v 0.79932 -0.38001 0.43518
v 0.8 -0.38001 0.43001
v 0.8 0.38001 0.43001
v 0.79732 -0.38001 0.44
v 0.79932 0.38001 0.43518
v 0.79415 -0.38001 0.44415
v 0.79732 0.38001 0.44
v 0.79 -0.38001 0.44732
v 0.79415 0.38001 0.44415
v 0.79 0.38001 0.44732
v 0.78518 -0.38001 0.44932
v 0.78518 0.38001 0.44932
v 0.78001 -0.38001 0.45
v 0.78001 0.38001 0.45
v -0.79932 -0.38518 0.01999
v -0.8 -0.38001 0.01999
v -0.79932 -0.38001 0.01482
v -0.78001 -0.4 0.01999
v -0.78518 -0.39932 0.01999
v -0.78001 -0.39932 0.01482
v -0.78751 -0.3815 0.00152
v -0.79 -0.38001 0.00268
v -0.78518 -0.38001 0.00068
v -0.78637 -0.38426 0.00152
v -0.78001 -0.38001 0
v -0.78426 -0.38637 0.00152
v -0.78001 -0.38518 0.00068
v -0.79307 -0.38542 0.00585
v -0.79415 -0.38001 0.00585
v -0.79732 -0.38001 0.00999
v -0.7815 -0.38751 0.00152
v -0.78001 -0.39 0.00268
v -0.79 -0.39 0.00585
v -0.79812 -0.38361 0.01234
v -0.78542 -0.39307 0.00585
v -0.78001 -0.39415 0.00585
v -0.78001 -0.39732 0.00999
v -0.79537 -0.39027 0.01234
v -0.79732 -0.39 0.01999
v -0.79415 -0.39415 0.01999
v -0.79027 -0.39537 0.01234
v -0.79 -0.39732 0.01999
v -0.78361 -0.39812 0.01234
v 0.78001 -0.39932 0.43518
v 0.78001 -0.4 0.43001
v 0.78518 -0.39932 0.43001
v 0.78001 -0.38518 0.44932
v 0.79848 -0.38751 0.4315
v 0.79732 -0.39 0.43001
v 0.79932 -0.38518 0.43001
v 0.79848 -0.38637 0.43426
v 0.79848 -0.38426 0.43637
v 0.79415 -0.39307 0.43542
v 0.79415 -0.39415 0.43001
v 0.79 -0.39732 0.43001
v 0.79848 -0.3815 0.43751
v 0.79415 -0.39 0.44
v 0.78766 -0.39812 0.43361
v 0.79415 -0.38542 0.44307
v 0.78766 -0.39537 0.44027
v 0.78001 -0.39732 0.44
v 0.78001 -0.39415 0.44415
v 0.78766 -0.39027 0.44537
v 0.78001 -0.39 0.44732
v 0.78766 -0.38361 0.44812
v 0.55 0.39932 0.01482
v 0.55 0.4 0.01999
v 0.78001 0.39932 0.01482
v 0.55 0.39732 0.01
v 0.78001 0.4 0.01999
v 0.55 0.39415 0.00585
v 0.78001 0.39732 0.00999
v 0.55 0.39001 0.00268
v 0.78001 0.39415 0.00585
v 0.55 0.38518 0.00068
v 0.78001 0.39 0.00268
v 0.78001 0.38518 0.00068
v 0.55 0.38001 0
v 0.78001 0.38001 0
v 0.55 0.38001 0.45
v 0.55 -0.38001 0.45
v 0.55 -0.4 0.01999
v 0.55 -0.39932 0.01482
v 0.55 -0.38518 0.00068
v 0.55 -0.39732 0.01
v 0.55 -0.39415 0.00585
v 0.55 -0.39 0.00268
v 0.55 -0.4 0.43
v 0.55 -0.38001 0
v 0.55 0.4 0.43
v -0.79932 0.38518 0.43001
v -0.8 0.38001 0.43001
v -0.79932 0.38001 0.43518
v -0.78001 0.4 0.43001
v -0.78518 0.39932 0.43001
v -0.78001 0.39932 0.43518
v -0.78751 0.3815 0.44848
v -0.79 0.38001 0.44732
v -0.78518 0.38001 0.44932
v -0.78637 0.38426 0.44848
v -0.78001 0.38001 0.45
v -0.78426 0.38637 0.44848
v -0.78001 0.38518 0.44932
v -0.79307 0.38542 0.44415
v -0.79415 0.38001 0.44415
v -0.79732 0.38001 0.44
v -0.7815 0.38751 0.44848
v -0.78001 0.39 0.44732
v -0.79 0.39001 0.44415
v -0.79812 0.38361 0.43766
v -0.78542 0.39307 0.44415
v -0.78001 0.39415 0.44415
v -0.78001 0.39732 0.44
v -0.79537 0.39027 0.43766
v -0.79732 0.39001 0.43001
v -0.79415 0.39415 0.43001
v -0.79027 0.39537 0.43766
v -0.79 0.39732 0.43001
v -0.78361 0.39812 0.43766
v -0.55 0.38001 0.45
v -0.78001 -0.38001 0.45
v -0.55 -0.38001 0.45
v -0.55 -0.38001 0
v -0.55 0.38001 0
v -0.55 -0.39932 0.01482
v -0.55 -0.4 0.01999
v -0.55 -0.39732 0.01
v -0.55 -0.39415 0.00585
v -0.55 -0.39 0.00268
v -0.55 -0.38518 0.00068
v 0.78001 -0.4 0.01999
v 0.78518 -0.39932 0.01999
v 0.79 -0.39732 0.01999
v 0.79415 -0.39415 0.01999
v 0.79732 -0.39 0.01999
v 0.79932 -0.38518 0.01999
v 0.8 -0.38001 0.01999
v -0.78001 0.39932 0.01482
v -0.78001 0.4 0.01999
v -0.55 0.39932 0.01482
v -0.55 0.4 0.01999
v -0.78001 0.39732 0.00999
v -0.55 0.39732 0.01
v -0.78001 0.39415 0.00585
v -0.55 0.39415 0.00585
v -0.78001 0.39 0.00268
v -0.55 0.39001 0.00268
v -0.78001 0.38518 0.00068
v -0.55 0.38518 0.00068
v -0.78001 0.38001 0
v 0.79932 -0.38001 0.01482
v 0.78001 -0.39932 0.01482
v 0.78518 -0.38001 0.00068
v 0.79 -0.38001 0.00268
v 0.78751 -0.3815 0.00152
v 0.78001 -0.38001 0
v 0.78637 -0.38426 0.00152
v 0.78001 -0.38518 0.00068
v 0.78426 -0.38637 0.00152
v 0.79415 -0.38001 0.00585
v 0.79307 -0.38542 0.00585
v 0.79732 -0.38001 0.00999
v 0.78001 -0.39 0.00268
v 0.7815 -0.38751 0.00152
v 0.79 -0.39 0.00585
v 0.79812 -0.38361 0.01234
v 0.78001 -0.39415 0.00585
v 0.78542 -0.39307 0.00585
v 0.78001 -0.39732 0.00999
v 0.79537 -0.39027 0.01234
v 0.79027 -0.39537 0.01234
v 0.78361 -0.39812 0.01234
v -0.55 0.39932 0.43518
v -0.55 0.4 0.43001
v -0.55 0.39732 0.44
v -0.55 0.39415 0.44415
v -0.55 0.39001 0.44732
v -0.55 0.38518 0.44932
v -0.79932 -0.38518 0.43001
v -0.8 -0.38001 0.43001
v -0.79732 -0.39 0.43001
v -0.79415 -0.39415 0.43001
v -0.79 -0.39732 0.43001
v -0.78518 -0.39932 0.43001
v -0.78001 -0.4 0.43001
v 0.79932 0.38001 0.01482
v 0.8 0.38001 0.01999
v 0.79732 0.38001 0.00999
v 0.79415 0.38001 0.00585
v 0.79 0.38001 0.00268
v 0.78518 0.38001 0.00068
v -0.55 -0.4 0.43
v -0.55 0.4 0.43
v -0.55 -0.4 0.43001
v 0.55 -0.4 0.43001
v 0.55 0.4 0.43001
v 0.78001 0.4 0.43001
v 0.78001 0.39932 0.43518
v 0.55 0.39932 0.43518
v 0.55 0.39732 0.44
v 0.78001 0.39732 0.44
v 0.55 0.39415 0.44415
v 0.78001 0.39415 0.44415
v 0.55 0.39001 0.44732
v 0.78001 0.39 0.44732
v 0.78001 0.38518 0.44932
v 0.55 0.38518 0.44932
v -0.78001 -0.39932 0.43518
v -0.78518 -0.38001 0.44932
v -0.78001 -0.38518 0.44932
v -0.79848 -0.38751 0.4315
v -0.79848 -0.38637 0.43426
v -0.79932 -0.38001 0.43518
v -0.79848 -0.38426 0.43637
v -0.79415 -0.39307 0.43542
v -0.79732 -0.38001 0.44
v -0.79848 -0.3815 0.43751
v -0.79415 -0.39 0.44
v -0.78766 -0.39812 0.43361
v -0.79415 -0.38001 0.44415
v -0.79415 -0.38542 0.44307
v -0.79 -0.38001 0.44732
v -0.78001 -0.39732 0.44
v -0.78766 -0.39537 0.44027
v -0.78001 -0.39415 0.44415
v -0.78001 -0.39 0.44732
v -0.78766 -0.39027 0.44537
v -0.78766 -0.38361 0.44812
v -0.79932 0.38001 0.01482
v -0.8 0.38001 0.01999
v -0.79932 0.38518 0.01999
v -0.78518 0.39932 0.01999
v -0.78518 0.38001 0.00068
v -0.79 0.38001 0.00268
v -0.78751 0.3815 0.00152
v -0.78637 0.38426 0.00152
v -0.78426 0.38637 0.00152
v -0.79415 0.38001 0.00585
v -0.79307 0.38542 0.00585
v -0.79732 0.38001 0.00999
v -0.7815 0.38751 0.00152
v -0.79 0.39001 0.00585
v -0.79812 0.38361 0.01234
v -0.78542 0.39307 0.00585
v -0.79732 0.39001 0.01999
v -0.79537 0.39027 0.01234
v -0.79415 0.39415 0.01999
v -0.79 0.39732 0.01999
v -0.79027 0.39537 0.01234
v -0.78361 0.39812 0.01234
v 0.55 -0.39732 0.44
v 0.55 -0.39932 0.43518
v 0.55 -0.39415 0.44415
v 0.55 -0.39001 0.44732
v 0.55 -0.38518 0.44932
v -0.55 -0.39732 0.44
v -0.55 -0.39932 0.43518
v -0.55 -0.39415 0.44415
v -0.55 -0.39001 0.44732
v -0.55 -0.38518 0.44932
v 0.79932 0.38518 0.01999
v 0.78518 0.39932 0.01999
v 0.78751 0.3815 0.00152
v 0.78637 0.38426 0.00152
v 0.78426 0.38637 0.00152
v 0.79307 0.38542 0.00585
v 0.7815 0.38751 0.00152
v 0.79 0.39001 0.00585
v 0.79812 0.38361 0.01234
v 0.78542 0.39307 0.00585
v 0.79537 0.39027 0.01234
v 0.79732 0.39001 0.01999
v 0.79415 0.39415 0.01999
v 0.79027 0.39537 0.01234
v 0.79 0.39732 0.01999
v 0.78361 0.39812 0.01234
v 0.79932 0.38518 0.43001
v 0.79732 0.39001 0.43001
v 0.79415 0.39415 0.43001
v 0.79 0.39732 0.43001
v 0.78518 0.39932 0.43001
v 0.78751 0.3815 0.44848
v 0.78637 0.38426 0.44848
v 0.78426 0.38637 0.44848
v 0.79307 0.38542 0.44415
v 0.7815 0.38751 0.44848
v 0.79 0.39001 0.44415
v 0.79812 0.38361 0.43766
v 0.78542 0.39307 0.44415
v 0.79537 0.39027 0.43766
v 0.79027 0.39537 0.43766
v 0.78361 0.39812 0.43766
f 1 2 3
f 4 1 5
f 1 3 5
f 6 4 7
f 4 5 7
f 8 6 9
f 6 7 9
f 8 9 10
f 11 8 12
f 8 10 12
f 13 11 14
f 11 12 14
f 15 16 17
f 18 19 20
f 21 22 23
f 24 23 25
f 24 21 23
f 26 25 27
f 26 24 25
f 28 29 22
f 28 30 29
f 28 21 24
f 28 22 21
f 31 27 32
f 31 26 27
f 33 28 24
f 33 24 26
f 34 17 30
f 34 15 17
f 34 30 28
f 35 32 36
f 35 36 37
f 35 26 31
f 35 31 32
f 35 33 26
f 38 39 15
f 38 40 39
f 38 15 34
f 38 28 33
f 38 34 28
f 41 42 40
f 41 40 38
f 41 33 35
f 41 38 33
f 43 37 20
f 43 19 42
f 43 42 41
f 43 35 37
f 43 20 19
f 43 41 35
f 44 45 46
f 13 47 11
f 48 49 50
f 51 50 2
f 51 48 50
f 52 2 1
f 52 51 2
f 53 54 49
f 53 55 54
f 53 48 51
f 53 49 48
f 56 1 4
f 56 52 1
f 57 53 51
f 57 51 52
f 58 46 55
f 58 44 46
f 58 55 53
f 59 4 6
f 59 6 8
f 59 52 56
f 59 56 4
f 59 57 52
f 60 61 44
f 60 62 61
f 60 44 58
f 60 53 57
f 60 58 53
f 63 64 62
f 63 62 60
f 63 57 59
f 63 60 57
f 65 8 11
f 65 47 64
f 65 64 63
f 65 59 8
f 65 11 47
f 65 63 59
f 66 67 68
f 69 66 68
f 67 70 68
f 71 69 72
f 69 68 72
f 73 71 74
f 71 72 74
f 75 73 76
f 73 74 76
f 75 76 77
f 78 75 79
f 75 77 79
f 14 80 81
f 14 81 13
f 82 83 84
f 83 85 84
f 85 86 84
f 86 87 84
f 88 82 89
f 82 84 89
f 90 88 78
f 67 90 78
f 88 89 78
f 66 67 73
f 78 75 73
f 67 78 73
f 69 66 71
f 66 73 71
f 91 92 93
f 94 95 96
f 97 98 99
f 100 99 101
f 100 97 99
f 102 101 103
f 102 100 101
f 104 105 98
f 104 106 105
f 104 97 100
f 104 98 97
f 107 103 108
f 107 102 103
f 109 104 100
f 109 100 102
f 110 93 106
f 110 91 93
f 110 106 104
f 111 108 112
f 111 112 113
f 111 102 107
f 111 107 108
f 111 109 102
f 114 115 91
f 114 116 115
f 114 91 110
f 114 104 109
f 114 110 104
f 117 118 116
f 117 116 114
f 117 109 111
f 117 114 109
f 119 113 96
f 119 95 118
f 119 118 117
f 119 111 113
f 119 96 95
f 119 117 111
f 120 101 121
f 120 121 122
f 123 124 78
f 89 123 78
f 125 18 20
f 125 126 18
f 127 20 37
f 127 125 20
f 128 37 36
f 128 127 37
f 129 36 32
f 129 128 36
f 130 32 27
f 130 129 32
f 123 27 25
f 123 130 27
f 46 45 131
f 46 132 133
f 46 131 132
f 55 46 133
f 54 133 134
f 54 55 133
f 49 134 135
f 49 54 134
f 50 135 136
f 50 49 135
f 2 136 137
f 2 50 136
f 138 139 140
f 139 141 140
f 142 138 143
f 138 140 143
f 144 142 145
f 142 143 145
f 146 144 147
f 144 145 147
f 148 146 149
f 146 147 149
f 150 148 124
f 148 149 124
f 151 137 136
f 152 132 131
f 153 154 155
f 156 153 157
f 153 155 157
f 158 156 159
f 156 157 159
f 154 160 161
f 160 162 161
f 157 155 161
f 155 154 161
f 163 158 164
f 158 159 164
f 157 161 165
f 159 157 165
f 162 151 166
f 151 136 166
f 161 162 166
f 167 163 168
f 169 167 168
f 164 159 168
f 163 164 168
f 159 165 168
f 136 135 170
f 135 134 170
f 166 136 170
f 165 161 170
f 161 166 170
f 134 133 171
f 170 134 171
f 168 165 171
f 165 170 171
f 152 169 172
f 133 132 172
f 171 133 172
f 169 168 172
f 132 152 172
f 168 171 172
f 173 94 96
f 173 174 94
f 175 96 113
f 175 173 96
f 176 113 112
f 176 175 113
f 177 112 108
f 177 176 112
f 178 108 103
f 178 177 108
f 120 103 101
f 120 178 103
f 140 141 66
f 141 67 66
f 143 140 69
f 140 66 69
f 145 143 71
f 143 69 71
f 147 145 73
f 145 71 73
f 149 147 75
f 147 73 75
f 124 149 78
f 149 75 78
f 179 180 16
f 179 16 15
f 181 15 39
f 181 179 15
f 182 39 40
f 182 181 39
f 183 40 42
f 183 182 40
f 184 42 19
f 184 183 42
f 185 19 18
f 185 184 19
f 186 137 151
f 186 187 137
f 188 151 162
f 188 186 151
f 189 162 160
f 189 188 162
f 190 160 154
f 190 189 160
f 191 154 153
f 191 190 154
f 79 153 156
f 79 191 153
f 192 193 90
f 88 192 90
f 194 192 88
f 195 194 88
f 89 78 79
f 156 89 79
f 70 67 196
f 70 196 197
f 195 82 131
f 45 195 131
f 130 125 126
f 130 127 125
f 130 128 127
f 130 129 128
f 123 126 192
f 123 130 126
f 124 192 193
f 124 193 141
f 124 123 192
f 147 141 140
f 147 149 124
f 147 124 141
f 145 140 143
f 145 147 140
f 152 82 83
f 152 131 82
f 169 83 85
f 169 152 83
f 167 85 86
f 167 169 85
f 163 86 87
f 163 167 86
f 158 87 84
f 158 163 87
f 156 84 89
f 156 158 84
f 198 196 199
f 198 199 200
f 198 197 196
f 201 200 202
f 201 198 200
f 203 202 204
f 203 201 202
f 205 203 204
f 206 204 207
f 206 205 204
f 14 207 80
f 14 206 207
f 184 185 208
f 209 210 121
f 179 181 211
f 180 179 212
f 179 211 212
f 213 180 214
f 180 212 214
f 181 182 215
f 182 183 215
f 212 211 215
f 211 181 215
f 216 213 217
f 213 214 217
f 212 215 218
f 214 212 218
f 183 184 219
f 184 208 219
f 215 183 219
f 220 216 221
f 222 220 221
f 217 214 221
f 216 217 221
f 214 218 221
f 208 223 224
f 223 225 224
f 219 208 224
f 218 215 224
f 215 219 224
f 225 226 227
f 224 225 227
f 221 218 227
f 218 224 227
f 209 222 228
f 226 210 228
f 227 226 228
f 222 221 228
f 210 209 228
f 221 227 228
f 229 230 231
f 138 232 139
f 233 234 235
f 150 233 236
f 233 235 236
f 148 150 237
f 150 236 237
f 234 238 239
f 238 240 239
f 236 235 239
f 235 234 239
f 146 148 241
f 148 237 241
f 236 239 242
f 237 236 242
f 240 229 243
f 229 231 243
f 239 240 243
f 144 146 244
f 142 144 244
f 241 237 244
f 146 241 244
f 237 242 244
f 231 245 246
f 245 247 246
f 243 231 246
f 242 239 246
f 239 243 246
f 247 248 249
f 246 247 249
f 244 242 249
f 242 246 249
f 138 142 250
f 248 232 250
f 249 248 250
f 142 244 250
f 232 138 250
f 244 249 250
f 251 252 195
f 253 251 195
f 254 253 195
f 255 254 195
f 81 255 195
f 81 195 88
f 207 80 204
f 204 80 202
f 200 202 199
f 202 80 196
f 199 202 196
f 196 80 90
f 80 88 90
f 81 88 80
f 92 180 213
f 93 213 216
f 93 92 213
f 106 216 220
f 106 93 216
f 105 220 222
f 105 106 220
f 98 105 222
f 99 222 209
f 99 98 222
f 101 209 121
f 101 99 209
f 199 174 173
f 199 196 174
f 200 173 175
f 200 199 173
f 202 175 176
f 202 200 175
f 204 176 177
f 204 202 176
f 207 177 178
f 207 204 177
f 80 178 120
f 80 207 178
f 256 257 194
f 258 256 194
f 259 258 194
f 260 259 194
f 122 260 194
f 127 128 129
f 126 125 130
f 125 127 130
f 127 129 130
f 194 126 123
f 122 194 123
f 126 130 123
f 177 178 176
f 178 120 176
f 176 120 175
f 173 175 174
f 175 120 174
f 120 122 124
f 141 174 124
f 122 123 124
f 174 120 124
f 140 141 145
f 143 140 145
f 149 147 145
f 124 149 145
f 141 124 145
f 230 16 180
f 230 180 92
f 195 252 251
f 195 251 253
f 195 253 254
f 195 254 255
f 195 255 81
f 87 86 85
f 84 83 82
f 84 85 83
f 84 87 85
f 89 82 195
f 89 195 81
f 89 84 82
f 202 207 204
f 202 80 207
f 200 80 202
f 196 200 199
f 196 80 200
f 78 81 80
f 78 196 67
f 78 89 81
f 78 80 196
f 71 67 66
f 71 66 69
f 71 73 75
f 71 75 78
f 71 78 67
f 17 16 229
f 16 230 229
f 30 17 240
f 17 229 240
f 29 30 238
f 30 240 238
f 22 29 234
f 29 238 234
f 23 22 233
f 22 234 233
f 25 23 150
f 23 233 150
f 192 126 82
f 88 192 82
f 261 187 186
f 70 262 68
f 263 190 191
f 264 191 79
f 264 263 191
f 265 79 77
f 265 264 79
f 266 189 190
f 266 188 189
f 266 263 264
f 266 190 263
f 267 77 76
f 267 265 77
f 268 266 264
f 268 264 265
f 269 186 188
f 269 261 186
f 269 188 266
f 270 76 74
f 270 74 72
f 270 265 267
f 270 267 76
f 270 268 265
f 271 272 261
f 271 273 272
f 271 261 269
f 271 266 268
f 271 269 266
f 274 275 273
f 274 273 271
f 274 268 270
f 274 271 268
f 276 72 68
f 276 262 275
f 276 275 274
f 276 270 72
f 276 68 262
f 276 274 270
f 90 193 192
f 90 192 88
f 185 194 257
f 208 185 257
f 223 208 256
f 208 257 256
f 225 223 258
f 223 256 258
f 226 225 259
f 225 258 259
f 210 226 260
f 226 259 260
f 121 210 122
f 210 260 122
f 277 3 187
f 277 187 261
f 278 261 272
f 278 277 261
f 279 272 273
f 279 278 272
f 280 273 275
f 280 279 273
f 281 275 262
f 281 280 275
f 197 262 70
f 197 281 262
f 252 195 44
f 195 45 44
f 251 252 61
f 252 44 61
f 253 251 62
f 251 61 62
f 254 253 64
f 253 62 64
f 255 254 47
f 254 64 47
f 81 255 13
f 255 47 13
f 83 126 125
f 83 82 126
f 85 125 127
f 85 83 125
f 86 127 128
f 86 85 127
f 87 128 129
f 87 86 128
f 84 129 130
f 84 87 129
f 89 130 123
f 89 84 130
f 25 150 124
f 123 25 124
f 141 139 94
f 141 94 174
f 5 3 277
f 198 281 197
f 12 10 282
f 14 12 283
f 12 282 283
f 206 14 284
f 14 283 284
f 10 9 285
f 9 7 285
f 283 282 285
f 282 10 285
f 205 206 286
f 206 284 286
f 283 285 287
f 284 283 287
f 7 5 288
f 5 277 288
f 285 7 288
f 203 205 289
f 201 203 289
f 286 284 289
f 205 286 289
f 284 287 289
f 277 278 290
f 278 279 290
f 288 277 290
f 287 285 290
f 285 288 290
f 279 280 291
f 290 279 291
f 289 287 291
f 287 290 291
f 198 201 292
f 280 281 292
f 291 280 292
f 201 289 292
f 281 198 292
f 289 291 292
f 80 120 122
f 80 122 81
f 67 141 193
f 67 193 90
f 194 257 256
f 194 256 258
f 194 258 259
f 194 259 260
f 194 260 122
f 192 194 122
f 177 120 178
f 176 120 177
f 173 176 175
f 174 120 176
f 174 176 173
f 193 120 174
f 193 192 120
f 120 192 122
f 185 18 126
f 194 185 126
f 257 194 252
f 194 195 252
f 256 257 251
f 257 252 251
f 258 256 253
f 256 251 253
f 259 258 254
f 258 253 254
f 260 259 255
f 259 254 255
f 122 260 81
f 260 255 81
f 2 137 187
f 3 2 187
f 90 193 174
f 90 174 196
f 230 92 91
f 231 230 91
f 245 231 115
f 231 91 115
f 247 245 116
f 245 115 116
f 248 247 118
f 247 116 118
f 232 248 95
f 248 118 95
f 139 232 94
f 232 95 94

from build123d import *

# Parameters (mm, degrees)
F2_W     = 1.1
F2_H     = 0.8
F3_DEPTH = 0.43
F2_W_2   = 0.25
F4_DEPTH = 0.45
F5_DEPTH = 0.45
F6_DEPTH = 0.02
F7_R     = 0.01999
F7_2_R   = 0.01999
F7_3_R   = 0.01999
F7_4_R   = 0.01999


# Not quite as in the source:
# - a fillet or chamfer is up to 0.001 mm smaller than in the source, because OpenCascade refuses the exact size


with BuildPart() as f3:
    # F2 (on Top) → F3 (new body)
    with BuildSketch(Plane.XY):
        Rectangle(F2_W, F2_H)
    extrude(amount=F3_DEPTH)


with BuildPart() as f4:
    # F2 (on Top) → F4 (new body)
    with BuildSketch(Plane.XY):
        with Locations((-0.675, 0)):
            Rectangle(F2_W_2, F2_H)
    extrude(amount=F4_DEPTH)

    # F7 (radius 0.02 in the source; OpenCascade refuses exactly that, so slightly less here)
    f7_edges = [f4.edges().sort_by_distance(p)[0] for p in [
        (-0.675, -0.4, 0.45),
        (-0.8, 0.4, 0.225),
        (-0.8, -0.4, 0.225),
        (-0.8, 0, 0),
        (-0.8, 0, 0.45),
        (-0.675, 0.4, 0.45),
        (-0.675, 0.4, 0),
        (-0.675, -0.4, 0),
    ]]
    fillet(f7_edges, radius=F7_R)


with BuildPart() as f5:
    # F2 (on Top) → F5 (new body)
    with BuildSketch(Plane.XY):
        with Locations((0.675, 0)):
            Rectangle(F2_W_2, F2_H)
    extrude(amount=F5_DEPTH)

    # F7#2 (radius 0.02 in the source; OpenCascade refuses exactly that, so slightly less here)
    f7_2_edges = [f5.edges().sort_by_distance(p)[0] for p in [
        (0.675, -0.4, 0.45),
        (0.8, -0.4, 0.225),
        (0.8, 0.4, 0.225),
        (0.8, 0, 0),
        (0.8, 0, 0.45),
        (0.675, 0.4, 0.45),
        (0.675, 0.4, 0),
        (0.675, -0.4, 0),
    ]]
    fillet(f7_2_edges, radius=F7_2_R)


with BuildPart() as f6:
    # F6 (new): a face of the model
    f6_faces = [f3.part.faces().sort_by_distance(p)[0] for p in [
        (0, 0, 0.43),
    ]]
    extrude(f6_faces, amount=F6_DEPTH)

    # F7#4 (radius 0.02 in the source; OpenCascade refuses exactly that, so slightly less here)
    f7_4_edges = [f6.edges().sort_by_distance(p)[0] for p in [
        (0, -0.4, 0.45),
        (0, 0.4, 0.45),
    ]]
    fillet(f7_4_edges, radius=F7_4_R)


with BuildPart() as f3_1:
    add(f3.part)

    # F7#3 (radius 0.02 in the source; OpenCascade refuses exactly that, so slightly less here)
    f7_3_edges = [f3_1.edges().sort_by_distance(p)[0] for p in [
        (0, 0.4, 0),
        (0, -0.4, 0),
    ]]
    fillet(f7_3_edges, radius=F7_3_R)


solid = Compound([f4.part, f5.part, f6.part, f3_1.part])
